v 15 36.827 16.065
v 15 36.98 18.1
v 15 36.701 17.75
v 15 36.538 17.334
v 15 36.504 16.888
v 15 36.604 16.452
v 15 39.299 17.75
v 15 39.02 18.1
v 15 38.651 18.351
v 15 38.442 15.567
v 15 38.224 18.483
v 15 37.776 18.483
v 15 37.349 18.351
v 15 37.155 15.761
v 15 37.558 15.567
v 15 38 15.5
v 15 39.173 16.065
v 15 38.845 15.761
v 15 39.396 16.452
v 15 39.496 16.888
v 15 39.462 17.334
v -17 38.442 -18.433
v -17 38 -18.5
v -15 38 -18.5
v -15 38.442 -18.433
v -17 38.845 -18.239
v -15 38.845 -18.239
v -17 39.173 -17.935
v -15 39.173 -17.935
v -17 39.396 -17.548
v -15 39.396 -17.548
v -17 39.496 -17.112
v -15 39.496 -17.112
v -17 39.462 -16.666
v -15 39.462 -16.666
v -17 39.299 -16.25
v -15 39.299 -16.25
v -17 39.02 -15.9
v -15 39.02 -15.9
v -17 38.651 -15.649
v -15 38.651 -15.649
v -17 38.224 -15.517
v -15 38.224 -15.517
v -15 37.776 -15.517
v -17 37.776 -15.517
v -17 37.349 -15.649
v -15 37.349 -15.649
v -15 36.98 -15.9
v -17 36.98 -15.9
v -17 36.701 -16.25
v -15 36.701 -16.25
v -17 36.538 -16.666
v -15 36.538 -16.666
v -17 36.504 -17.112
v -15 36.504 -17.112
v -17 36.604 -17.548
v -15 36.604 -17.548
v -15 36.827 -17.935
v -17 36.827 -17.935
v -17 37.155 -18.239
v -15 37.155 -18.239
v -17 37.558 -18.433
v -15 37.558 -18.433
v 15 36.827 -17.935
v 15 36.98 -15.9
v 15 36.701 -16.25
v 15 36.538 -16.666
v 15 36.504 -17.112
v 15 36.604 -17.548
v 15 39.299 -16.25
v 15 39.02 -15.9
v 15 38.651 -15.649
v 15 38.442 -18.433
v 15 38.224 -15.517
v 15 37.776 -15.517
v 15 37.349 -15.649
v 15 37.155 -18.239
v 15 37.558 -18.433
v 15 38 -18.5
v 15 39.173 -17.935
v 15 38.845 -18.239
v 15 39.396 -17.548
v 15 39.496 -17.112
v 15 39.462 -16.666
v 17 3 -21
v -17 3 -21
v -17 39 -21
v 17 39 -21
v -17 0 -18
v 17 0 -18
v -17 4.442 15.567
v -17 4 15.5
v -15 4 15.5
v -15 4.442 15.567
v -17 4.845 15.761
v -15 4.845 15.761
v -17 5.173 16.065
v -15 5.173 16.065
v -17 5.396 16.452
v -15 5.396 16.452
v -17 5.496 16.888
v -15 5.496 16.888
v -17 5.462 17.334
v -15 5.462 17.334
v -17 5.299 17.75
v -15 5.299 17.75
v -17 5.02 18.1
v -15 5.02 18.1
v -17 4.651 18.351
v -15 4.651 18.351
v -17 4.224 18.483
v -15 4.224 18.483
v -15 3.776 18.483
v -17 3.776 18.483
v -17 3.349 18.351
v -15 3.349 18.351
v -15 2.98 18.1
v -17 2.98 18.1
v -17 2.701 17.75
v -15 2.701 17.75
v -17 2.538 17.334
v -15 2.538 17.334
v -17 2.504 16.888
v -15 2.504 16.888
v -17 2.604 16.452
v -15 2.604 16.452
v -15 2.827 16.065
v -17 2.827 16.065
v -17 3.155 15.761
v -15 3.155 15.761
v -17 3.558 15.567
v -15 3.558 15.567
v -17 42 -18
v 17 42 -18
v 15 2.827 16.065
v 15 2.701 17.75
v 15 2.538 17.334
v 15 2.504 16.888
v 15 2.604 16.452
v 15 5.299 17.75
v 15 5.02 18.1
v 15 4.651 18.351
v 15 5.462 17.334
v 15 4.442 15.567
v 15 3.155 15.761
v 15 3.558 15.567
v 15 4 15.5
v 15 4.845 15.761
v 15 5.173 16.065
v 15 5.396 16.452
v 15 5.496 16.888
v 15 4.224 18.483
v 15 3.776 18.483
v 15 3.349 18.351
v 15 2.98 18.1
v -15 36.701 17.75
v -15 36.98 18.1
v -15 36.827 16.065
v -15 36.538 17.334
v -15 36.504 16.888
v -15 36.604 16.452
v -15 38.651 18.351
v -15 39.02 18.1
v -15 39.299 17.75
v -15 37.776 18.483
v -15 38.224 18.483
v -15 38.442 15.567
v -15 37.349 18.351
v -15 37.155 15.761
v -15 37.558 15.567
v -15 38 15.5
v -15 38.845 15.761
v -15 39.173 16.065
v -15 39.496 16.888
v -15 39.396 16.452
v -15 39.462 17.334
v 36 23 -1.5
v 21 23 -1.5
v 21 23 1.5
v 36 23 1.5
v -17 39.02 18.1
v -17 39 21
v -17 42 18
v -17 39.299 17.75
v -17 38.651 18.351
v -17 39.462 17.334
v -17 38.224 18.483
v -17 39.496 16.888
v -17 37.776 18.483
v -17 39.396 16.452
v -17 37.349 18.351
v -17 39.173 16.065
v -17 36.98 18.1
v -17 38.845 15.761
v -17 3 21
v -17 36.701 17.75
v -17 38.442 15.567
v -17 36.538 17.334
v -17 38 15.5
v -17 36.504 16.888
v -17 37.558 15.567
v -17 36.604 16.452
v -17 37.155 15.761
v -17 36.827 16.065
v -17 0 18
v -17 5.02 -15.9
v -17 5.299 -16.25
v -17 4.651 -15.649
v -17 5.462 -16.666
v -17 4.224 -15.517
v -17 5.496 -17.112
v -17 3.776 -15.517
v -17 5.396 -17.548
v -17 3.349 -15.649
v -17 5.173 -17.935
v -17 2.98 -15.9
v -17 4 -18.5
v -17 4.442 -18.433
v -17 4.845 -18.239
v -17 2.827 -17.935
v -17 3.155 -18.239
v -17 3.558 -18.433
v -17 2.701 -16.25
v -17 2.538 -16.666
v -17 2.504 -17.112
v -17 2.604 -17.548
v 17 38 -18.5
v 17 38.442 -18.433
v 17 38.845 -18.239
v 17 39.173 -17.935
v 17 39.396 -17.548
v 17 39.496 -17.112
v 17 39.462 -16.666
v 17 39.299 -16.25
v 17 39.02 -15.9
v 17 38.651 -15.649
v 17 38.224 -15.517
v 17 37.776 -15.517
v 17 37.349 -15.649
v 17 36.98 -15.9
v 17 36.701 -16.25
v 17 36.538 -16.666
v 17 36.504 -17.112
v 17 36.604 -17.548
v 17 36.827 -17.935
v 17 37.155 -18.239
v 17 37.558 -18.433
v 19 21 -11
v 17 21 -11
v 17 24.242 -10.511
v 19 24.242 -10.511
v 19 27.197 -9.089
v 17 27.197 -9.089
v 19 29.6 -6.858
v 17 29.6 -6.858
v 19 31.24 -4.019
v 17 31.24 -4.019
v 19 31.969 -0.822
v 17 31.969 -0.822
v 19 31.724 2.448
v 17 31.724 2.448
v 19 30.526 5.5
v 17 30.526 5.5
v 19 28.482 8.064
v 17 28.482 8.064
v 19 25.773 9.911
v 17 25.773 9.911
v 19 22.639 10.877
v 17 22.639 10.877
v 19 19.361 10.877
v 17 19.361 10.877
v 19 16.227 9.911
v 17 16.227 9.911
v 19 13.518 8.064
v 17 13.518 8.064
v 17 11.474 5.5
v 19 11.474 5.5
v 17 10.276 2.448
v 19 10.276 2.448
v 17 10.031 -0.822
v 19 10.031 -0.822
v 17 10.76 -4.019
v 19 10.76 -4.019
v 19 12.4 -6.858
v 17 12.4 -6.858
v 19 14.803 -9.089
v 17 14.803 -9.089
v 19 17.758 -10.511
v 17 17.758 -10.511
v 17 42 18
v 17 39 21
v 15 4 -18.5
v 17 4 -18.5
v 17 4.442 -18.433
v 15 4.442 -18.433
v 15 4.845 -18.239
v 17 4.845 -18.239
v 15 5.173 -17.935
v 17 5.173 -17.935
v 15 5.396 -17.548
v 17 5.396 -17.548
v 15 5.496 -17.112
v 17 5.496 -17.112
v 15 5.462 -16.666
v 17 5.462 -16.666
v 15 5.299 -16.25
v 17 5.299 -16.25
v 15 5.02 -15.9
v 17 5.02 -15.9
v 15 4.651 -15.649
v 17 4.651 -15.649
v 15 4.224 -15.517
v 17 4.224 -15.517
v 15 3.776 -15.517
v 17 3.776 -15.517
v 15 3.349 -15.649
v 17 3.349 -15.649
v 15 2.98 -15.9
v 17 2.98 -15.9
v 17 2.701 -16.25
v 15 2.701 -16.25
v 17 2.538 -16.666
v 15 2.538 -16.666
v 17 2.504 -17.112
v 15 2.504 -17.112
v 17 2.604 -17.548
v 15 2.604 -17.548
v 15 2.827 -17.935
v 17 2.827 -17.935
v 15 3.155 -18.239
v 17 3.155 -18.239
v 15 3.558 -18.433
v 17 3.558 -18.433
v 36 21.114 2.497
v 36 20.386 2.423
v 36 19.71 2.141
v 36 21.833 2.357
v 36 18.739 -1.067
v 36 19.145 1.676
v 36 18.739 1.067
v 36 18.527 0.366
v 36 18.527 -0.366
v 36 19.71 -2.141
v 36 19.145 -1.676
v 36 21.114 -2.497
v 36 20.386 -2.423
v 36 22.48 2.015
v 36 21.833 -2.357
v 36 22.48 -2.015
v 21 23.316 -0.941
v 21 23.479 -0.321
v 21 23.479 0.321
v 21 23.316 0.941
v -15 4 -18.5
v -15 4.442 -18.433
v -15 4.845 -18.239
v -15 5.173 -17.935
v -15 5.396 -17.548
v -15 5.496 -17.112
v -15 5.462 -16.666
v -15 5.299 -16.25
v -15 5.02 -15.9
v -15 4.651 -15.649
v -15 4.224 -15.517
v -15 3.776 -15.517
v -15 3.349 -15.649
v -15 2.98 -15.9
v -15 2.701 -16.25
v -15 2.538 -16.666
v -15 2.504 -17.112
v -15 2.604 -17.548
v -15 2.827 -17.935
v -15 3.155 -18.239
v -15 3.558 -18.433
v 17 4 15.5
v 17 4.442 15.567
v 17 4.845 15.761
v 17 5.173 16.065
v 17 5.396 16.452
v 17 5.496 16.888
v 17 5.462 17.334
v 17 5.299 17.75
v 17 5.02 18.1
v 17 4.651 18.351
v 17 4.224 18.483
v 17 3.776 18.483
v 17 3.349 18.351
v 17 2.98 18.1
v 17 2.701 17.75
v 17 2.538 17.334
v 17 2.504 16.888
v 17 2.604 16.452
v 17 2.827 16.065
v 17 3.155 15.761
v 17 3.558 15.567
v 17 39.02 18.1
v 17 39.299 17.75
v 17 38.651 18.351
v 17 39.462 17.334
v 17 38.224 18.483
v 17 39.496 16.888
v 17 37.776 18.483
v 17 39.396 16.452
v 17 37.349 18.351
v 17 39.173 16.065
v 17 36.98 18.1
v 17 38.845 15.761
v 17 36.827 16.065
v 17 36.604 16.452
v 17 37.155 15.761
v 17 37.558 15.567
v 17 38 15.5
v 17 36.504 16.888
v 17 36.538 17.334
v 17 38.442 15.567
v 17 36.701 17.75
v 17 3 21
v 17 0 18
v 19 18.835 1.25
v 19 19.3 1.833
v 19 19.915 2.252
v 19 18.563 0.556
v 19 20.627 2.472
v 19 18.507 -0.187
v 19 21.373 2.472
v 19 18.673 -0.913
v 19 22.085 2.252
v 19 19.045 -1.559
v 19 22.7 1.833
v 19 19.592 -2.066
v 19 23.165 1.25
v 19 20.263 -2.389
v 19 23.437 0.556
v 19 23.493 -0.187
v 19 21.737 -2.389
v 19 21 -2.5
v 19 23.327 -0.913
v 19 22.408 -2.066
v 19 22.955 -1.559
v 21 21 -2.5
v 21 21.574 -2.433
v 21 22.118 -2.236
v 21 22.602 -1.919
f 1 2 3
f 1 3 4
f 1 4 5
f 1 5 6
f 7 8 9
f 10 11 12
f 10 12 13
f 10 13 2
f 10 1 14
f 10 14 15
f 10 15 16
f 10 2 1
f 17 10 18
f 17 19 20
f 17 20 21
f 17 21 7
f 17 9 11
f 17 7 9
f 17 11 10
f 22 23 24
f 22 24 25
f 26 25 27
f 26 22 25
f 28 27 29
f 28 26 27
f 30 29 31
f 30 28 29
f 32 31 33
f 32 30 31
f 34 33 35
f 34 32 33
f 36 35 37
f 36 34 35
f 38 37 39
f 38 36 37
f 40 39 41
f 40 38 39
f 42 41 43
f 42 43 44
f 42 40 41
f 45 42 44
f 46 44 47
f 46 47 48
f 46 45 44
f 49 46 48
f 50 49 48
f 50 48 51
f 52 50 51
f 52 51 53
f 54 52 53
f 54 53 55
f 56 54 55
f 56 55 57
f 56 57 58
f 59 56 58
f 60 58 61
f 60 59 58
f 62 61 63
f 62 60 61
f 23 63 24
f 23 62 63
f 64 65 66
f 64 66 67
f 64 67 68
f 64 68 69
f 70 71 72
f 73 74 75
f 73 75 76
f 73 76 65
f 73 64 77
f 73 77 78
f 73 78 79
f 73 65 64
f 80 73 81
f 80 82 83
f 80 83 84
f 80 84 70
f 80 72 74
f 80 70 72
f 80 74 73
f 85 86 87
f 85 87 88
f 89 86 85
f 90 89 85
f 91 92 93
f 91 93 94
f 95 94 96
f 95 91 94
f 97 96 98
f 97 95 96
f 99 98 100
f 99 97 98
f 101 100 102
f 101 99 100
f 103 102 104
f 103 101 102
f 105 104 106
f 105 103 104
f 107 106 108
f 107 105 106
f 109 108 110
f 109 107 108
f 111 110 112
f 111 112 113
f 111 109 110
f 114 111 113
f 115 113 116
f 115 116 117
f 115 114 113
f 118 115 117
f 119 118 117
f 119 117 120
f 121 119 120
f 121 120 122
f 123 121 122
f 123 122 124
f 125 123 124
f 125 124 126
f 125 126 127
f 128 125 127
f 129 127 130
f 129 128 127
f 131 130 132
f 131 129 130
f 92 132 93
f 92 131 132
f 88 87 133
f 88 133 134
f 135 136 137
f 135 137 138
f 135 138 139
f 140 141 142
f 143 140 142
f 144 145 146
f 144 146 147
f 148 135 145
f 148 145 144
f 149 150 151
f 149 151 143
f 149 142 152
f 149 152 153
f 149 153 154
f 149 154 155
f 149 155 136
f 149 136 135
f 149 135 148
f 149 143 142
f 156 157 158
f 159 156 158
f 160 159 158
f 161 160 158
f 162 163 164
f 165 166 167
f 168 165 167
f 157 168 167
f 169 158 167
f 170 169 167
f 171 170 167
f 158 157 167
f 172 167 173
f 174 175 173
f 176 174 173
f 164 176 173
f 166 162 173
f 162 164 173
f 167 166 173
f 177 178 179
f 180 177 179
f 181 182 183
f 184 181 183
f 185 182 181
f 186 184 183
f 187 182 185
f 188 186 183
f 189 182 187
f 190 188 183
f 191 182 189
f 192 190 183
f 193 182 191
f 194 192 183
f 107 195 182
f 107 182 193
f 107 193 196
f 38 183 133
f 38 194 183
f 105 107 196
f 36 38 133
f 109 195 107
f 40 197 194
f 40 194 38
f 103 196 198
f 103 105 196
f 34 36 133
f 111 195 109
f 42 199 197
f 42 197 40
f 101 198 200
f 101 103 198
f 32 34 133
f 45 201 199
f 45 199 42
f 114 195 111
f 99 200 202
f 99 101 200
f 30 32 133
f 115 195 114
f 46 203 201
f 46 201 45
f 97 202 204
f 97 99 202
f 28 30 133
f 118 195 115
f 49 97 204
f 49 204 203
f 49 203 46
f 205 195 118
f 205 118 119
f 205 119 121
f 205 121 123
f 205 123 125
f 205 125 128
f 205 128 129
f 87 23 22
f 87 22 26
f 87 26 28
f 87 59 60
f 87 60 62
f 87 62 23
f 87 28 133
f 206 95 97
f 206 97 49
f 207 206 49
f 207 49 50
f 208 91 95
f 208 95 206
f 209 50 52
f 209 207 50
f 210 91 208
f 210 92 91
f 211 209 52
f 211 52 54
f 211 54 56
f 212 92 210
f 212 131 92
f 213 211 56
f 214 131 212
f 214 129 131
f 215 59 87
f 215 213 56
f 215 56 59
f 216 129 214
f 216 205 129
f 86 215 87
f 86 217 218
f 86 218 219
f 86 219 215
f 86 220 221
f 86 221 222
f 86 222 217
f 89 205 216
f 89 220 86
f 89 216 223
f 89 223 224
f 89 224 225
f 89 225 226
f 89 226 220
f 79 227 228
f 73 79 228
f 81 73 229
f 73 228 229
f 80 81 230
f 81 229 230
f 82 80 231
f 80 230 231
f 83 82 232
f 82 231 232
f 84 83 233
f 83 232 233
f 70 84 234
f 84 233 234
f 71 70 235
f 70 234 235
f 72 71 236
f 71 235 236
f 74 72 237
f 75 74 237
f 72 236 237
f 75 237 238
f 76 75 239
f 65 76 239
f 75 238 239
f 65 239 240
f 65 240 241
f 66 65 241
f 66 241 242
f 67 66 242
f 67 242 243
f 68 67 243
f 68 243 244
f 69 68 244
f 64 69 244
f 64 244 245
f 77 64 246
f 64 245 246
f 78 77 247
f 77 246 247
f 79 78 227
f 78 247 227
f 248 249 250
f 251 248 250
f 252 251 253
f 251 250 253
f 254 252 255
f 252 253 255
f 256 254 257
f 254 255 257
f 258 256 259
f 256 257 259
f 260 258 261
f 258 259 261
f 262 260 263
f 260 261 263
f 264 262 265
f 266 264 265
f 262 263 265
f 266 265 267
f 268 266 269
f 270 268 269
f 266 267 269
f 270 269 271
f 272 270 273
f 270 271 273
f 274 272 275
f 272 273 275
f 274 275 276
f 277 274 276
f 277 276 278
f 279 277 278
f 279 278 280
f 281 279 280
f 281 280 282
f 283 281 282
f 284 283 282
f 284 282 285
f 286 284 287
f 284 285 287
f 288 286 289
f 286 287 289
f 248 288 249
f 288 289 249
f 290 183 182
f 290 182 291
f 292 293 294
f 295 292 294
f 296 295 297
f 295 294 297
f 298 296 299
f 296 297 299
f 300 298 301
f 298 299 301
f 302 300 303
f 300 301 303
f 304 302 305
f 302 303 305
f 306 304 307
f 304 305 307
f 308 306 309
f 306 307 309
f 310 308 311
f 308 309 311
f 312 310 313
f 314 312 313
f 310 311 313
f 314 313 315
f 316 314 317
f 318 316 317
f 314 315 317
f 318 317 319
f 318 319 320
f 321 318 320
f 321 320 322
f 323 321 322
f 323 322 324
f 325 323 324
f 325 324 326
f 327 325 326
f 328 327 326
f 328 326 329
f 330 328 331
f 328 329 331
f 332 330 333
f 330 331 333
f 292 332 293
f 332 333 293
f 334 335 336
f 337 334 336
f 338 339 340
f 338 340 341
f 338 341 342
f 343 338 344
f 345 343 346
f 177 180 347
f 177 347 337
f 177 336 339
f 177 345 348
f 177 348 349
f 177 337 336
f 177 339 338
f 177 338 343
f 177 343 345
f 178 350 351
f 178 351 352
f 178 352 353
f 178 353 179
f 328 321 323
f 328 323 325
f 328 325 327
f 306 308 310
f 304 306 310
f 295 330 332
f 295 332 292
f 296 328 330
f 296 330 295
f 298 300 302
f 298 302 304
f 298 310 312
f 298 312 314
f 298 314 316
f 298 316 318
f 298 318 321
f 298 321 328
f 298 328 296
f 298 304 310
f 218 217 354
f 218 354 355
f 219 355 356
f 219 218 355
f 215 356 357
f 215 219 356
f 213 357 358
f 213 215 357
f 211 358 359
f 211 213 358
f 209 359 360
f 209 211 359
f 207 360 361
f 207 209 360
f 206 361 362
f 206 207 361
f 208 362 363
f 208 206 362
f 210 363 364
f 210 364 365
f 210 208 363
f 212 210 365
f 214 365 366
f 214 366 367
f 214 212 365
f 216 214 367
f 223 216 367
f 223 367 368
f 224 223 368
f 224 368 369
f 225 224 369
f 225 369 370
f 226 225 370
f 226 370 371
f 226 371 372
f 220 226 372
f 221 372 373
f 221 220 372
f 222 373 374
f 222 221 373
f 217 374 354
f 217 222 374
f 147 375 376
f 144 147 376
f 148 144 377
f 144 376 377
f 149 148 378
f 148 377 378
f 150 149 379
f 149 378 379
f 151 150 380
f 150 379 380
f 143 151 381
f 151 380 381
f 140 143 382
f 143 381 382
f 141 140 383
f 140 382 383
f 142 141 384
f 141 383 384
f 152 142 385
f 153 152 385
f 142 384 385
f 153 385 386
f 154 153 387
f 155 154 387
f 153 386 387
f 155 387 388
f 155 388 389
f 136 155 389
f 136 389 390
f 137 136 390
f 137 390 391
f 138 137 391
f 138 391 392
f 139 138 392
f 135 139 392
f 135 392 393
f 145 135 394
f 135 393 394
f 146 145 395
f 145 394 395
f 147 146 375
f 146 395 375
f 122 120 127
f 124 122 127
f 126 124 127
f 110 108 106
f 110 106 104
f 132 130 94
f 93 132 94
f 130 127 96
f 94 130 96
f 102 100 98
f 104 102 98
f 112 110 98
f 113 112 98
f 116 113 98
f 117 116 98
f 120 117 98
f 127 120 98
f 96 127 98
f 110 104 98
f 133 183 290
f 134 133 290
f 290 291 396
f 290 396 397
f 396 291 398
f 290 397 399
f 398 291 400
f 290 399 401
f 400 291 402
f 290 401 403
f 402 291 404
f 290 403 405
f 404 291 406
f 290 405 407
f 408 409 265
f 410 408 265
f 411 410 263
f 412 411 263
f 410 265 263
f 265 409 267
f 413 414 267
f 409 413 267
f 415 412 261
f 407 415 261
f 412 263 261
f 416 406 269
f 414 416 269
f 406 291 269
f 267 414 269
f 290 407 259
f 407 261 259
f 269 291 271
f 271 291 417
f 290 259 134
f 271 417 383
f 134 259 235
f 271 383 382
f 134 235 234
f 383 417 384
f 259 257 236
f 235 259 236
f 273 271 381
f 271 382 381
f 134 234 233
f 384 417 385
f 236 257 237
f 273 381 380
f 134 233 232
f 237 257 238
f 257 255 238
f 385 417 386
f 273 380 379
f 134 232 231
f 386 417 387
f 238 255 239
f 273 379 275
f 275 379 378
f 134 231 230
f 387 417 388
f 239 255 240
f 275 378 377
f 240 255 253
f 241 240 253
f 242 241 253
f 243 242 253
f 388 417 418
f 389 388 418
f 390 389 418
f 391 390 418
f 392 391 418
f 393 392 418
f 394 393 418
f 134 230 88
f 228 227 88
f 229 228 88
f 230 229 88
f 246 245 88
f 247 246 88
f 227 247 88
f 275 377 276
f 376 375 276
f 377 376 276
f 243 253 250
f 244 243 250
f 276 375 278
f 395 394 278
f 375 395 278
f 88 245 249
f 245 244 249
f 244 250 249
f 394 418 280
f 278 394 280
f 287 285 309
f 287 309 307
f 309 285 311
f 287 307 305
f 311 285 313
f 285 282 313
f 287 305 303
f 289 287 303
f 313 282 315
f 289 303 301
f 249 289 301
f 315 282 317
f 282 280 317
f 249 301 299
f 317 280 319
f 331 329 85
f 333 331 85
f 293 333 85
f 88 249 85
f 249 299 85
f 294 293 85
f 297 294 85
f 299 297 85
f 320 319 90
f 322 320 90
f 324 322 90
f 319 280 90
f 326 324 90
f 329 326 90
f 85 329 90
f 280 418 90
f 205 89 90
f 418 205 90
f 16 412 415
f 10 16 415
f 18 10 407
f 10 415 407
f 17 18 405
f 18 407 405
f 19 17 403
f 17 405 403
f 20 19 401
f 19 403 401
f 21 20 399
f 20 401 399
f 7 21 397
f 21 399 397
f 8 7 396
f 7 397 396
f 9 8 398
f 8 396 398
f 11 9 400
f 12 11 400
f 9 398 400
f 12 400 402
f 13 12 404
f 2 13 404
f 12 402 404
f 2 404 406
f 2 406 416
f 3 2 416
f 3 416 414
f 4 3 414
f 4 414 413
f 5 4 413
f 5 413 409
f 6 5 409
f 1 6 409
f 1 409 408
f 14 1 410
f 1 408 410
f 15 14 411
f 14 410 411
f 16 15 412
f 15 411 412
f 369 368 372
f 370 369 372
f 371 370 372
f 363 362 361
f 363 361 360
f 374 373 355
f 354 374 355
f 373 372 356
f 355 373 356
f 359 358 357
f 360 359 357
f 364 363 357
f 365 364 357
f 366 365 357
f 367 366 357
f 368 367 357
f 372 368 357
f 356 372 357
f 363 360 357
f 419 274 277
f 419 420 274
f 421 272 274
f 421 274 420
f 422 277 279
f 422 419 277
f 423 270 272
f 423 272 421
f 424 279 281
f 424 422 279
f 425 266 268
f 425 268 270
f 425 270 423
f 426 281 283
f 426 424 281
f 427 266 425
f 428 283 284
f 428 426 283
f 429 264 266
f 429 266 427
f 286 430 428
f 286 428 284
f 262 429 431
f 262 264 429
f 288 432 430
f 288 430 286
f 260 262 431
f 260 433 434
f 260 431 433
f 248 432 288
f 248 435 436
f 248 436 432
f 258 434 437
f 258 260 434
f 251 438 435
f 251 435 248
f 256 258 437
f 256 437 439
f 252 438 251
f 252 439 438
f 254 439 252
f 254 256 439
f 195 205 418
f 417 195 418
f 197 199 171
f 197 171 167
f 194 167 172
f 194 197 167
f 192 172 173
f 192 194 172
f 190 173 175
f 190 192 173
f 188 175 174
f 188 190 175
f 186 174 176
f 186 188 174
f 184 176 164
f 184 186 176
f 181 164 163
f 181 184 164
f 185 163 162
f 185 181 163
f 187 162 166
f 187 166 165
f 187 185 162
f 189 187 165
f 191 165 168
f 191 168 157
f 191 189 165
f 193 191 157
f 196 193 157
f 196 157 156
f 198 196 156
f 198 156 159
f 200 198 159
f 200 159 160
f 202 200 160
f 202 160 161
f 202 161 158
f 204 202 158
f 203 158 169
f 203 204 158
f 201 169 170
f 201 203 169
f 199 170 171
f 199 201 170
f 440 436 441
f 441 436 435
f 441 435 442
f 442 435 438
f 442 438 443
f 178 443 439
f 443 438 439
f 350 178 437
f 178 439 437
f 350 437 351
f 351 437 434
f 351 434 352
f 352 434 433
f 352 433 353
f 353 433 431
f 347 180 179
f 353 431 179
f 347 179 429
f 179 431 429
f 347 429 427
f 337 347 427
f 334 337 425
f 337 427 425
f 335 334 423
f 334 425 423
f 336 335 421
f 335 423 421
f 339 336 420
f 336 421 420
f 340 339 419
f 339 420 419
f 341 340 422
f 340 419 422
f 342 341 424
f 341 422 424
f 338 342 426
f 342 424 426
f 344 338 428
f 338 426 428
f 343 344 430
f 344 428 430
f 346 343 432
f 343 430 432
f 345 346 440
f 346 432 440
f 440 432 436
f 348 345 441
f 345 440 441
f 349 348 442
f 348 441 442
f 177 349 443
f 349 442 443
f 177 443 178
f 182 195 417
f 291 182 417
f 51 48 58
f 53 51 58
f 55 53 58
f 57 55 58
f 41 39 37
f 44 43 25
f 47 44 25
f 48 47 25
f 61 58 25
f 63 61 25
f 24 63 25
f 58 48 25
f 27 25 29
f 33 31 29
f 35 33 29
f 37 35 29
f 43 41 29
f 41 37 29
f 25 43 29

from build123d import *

# Parameters (mm, degrees)
SKETCH1_W           = 34
SKETCH1_H           = 42
BOSS_EXTRUDE1_DEPTH = 42
SKETCH2_R           = 11
BOSS_EXTRUDE2_DEPTH = 2
SKETCH3_R           = 2.5
BOSS_EXTRUDE3_DEPTH = 2
BOSS_EXTRUDE4_DEPTH = 15
CHAMFER1_SIZE       = 3
SKETCH5_R           = 1.5
CUT_EXTRUDE1_DEPTH  = 2


with BuildPart() as part:
    # Sketch1 → Boss-Extrude1 (new body)
    with BuildSketch(Plane(origin=(0, 0, 0), x_dir=(1, 0, 0), z_dir=(0, 1, 0))):
        Rectangle(SKETCH1_W, SKETCH1_H)
    extrude(amount=BOSS_EXTRUDE1_DEPTH)

    # Sketch2 → Boss-Extrude2 (add)
    with BuildSketch(Plane(origin=(17, 0, 0), x_dir=(0, 0, -1), z_dir=(1, 0, 0))):
        with Locations((0, 21)):
            Circle(SKETCH2_R)
    extrude(amount=BOSS_EXTRUDE2_DEPTH)

    # Sketch3 → Boss-Extrude3 (add)
    with BuildSketch(Plane(origin=(19, 0, 0), x_dir=(0, 0, -1), z_dir=(1, 0, 0))):
        with Locations((0, 21)):
            Circle(SKETCH3_R)
    extrude(amount=BOSS_EXTRUDE3_DEPTH)

    # Sketch4 → Boss-Extrude4 (add)
    with BuildSketch(Plane(origin=(21, 0, 0), x_dir=(0, 0, -1), z_dir=(1, 0, 0))):
        with BuildLine():
            Line((1.5, 23), (-1.5, 23))
            ThreePointArc((-1.5, 23), (0, 18.5), (1.5, 23))
        make_face()
    extrude(amount=BOSS_EXTRUDE4_DEPTH)

    # Chamfer1
    chamfer1_edges = [part.edges().sort_by_distance(p)[0] for p in [
        (0, 42, -21),
        (0, 0, -21),
        (0, 0, 21),
        (0, 42, 21),
    ]]
    chamfer(chamfer1_edges, length=CHAMFER1_SIZE)

    # Sketch5 → Cut-Extrude1 (cut)
    with BuildSketch(Plane(origin=(17, 0, 0), x_dir=(0, 0, -1), z_dir=(1, 0, 0))):
        with Locations((-17, 38)):
            Circle(SKETCH5_R)
        with Locations((-17, 4)):
            Circle(SKETCH5_R)
        with Locations((17, 4)):
            Circle(SKETCH5_R)
        with Locations((17, 38)):
            Circle(SKETCH5_R)
    cut_extrude1 = extrude(amount=-CUT_EXTRUDE1_DEPTH, mode=Mode.SUBTRACT)

    # Mirror1: Cut-Extrude1 across plane
    add(cut_extrude1.mirror(Plane(origin=(0, 0, 0), x_dir=(0, 0, 1), z_dir=(1, 0, 0))), mode=Mode.SUBTRACT)


solid = part.part
